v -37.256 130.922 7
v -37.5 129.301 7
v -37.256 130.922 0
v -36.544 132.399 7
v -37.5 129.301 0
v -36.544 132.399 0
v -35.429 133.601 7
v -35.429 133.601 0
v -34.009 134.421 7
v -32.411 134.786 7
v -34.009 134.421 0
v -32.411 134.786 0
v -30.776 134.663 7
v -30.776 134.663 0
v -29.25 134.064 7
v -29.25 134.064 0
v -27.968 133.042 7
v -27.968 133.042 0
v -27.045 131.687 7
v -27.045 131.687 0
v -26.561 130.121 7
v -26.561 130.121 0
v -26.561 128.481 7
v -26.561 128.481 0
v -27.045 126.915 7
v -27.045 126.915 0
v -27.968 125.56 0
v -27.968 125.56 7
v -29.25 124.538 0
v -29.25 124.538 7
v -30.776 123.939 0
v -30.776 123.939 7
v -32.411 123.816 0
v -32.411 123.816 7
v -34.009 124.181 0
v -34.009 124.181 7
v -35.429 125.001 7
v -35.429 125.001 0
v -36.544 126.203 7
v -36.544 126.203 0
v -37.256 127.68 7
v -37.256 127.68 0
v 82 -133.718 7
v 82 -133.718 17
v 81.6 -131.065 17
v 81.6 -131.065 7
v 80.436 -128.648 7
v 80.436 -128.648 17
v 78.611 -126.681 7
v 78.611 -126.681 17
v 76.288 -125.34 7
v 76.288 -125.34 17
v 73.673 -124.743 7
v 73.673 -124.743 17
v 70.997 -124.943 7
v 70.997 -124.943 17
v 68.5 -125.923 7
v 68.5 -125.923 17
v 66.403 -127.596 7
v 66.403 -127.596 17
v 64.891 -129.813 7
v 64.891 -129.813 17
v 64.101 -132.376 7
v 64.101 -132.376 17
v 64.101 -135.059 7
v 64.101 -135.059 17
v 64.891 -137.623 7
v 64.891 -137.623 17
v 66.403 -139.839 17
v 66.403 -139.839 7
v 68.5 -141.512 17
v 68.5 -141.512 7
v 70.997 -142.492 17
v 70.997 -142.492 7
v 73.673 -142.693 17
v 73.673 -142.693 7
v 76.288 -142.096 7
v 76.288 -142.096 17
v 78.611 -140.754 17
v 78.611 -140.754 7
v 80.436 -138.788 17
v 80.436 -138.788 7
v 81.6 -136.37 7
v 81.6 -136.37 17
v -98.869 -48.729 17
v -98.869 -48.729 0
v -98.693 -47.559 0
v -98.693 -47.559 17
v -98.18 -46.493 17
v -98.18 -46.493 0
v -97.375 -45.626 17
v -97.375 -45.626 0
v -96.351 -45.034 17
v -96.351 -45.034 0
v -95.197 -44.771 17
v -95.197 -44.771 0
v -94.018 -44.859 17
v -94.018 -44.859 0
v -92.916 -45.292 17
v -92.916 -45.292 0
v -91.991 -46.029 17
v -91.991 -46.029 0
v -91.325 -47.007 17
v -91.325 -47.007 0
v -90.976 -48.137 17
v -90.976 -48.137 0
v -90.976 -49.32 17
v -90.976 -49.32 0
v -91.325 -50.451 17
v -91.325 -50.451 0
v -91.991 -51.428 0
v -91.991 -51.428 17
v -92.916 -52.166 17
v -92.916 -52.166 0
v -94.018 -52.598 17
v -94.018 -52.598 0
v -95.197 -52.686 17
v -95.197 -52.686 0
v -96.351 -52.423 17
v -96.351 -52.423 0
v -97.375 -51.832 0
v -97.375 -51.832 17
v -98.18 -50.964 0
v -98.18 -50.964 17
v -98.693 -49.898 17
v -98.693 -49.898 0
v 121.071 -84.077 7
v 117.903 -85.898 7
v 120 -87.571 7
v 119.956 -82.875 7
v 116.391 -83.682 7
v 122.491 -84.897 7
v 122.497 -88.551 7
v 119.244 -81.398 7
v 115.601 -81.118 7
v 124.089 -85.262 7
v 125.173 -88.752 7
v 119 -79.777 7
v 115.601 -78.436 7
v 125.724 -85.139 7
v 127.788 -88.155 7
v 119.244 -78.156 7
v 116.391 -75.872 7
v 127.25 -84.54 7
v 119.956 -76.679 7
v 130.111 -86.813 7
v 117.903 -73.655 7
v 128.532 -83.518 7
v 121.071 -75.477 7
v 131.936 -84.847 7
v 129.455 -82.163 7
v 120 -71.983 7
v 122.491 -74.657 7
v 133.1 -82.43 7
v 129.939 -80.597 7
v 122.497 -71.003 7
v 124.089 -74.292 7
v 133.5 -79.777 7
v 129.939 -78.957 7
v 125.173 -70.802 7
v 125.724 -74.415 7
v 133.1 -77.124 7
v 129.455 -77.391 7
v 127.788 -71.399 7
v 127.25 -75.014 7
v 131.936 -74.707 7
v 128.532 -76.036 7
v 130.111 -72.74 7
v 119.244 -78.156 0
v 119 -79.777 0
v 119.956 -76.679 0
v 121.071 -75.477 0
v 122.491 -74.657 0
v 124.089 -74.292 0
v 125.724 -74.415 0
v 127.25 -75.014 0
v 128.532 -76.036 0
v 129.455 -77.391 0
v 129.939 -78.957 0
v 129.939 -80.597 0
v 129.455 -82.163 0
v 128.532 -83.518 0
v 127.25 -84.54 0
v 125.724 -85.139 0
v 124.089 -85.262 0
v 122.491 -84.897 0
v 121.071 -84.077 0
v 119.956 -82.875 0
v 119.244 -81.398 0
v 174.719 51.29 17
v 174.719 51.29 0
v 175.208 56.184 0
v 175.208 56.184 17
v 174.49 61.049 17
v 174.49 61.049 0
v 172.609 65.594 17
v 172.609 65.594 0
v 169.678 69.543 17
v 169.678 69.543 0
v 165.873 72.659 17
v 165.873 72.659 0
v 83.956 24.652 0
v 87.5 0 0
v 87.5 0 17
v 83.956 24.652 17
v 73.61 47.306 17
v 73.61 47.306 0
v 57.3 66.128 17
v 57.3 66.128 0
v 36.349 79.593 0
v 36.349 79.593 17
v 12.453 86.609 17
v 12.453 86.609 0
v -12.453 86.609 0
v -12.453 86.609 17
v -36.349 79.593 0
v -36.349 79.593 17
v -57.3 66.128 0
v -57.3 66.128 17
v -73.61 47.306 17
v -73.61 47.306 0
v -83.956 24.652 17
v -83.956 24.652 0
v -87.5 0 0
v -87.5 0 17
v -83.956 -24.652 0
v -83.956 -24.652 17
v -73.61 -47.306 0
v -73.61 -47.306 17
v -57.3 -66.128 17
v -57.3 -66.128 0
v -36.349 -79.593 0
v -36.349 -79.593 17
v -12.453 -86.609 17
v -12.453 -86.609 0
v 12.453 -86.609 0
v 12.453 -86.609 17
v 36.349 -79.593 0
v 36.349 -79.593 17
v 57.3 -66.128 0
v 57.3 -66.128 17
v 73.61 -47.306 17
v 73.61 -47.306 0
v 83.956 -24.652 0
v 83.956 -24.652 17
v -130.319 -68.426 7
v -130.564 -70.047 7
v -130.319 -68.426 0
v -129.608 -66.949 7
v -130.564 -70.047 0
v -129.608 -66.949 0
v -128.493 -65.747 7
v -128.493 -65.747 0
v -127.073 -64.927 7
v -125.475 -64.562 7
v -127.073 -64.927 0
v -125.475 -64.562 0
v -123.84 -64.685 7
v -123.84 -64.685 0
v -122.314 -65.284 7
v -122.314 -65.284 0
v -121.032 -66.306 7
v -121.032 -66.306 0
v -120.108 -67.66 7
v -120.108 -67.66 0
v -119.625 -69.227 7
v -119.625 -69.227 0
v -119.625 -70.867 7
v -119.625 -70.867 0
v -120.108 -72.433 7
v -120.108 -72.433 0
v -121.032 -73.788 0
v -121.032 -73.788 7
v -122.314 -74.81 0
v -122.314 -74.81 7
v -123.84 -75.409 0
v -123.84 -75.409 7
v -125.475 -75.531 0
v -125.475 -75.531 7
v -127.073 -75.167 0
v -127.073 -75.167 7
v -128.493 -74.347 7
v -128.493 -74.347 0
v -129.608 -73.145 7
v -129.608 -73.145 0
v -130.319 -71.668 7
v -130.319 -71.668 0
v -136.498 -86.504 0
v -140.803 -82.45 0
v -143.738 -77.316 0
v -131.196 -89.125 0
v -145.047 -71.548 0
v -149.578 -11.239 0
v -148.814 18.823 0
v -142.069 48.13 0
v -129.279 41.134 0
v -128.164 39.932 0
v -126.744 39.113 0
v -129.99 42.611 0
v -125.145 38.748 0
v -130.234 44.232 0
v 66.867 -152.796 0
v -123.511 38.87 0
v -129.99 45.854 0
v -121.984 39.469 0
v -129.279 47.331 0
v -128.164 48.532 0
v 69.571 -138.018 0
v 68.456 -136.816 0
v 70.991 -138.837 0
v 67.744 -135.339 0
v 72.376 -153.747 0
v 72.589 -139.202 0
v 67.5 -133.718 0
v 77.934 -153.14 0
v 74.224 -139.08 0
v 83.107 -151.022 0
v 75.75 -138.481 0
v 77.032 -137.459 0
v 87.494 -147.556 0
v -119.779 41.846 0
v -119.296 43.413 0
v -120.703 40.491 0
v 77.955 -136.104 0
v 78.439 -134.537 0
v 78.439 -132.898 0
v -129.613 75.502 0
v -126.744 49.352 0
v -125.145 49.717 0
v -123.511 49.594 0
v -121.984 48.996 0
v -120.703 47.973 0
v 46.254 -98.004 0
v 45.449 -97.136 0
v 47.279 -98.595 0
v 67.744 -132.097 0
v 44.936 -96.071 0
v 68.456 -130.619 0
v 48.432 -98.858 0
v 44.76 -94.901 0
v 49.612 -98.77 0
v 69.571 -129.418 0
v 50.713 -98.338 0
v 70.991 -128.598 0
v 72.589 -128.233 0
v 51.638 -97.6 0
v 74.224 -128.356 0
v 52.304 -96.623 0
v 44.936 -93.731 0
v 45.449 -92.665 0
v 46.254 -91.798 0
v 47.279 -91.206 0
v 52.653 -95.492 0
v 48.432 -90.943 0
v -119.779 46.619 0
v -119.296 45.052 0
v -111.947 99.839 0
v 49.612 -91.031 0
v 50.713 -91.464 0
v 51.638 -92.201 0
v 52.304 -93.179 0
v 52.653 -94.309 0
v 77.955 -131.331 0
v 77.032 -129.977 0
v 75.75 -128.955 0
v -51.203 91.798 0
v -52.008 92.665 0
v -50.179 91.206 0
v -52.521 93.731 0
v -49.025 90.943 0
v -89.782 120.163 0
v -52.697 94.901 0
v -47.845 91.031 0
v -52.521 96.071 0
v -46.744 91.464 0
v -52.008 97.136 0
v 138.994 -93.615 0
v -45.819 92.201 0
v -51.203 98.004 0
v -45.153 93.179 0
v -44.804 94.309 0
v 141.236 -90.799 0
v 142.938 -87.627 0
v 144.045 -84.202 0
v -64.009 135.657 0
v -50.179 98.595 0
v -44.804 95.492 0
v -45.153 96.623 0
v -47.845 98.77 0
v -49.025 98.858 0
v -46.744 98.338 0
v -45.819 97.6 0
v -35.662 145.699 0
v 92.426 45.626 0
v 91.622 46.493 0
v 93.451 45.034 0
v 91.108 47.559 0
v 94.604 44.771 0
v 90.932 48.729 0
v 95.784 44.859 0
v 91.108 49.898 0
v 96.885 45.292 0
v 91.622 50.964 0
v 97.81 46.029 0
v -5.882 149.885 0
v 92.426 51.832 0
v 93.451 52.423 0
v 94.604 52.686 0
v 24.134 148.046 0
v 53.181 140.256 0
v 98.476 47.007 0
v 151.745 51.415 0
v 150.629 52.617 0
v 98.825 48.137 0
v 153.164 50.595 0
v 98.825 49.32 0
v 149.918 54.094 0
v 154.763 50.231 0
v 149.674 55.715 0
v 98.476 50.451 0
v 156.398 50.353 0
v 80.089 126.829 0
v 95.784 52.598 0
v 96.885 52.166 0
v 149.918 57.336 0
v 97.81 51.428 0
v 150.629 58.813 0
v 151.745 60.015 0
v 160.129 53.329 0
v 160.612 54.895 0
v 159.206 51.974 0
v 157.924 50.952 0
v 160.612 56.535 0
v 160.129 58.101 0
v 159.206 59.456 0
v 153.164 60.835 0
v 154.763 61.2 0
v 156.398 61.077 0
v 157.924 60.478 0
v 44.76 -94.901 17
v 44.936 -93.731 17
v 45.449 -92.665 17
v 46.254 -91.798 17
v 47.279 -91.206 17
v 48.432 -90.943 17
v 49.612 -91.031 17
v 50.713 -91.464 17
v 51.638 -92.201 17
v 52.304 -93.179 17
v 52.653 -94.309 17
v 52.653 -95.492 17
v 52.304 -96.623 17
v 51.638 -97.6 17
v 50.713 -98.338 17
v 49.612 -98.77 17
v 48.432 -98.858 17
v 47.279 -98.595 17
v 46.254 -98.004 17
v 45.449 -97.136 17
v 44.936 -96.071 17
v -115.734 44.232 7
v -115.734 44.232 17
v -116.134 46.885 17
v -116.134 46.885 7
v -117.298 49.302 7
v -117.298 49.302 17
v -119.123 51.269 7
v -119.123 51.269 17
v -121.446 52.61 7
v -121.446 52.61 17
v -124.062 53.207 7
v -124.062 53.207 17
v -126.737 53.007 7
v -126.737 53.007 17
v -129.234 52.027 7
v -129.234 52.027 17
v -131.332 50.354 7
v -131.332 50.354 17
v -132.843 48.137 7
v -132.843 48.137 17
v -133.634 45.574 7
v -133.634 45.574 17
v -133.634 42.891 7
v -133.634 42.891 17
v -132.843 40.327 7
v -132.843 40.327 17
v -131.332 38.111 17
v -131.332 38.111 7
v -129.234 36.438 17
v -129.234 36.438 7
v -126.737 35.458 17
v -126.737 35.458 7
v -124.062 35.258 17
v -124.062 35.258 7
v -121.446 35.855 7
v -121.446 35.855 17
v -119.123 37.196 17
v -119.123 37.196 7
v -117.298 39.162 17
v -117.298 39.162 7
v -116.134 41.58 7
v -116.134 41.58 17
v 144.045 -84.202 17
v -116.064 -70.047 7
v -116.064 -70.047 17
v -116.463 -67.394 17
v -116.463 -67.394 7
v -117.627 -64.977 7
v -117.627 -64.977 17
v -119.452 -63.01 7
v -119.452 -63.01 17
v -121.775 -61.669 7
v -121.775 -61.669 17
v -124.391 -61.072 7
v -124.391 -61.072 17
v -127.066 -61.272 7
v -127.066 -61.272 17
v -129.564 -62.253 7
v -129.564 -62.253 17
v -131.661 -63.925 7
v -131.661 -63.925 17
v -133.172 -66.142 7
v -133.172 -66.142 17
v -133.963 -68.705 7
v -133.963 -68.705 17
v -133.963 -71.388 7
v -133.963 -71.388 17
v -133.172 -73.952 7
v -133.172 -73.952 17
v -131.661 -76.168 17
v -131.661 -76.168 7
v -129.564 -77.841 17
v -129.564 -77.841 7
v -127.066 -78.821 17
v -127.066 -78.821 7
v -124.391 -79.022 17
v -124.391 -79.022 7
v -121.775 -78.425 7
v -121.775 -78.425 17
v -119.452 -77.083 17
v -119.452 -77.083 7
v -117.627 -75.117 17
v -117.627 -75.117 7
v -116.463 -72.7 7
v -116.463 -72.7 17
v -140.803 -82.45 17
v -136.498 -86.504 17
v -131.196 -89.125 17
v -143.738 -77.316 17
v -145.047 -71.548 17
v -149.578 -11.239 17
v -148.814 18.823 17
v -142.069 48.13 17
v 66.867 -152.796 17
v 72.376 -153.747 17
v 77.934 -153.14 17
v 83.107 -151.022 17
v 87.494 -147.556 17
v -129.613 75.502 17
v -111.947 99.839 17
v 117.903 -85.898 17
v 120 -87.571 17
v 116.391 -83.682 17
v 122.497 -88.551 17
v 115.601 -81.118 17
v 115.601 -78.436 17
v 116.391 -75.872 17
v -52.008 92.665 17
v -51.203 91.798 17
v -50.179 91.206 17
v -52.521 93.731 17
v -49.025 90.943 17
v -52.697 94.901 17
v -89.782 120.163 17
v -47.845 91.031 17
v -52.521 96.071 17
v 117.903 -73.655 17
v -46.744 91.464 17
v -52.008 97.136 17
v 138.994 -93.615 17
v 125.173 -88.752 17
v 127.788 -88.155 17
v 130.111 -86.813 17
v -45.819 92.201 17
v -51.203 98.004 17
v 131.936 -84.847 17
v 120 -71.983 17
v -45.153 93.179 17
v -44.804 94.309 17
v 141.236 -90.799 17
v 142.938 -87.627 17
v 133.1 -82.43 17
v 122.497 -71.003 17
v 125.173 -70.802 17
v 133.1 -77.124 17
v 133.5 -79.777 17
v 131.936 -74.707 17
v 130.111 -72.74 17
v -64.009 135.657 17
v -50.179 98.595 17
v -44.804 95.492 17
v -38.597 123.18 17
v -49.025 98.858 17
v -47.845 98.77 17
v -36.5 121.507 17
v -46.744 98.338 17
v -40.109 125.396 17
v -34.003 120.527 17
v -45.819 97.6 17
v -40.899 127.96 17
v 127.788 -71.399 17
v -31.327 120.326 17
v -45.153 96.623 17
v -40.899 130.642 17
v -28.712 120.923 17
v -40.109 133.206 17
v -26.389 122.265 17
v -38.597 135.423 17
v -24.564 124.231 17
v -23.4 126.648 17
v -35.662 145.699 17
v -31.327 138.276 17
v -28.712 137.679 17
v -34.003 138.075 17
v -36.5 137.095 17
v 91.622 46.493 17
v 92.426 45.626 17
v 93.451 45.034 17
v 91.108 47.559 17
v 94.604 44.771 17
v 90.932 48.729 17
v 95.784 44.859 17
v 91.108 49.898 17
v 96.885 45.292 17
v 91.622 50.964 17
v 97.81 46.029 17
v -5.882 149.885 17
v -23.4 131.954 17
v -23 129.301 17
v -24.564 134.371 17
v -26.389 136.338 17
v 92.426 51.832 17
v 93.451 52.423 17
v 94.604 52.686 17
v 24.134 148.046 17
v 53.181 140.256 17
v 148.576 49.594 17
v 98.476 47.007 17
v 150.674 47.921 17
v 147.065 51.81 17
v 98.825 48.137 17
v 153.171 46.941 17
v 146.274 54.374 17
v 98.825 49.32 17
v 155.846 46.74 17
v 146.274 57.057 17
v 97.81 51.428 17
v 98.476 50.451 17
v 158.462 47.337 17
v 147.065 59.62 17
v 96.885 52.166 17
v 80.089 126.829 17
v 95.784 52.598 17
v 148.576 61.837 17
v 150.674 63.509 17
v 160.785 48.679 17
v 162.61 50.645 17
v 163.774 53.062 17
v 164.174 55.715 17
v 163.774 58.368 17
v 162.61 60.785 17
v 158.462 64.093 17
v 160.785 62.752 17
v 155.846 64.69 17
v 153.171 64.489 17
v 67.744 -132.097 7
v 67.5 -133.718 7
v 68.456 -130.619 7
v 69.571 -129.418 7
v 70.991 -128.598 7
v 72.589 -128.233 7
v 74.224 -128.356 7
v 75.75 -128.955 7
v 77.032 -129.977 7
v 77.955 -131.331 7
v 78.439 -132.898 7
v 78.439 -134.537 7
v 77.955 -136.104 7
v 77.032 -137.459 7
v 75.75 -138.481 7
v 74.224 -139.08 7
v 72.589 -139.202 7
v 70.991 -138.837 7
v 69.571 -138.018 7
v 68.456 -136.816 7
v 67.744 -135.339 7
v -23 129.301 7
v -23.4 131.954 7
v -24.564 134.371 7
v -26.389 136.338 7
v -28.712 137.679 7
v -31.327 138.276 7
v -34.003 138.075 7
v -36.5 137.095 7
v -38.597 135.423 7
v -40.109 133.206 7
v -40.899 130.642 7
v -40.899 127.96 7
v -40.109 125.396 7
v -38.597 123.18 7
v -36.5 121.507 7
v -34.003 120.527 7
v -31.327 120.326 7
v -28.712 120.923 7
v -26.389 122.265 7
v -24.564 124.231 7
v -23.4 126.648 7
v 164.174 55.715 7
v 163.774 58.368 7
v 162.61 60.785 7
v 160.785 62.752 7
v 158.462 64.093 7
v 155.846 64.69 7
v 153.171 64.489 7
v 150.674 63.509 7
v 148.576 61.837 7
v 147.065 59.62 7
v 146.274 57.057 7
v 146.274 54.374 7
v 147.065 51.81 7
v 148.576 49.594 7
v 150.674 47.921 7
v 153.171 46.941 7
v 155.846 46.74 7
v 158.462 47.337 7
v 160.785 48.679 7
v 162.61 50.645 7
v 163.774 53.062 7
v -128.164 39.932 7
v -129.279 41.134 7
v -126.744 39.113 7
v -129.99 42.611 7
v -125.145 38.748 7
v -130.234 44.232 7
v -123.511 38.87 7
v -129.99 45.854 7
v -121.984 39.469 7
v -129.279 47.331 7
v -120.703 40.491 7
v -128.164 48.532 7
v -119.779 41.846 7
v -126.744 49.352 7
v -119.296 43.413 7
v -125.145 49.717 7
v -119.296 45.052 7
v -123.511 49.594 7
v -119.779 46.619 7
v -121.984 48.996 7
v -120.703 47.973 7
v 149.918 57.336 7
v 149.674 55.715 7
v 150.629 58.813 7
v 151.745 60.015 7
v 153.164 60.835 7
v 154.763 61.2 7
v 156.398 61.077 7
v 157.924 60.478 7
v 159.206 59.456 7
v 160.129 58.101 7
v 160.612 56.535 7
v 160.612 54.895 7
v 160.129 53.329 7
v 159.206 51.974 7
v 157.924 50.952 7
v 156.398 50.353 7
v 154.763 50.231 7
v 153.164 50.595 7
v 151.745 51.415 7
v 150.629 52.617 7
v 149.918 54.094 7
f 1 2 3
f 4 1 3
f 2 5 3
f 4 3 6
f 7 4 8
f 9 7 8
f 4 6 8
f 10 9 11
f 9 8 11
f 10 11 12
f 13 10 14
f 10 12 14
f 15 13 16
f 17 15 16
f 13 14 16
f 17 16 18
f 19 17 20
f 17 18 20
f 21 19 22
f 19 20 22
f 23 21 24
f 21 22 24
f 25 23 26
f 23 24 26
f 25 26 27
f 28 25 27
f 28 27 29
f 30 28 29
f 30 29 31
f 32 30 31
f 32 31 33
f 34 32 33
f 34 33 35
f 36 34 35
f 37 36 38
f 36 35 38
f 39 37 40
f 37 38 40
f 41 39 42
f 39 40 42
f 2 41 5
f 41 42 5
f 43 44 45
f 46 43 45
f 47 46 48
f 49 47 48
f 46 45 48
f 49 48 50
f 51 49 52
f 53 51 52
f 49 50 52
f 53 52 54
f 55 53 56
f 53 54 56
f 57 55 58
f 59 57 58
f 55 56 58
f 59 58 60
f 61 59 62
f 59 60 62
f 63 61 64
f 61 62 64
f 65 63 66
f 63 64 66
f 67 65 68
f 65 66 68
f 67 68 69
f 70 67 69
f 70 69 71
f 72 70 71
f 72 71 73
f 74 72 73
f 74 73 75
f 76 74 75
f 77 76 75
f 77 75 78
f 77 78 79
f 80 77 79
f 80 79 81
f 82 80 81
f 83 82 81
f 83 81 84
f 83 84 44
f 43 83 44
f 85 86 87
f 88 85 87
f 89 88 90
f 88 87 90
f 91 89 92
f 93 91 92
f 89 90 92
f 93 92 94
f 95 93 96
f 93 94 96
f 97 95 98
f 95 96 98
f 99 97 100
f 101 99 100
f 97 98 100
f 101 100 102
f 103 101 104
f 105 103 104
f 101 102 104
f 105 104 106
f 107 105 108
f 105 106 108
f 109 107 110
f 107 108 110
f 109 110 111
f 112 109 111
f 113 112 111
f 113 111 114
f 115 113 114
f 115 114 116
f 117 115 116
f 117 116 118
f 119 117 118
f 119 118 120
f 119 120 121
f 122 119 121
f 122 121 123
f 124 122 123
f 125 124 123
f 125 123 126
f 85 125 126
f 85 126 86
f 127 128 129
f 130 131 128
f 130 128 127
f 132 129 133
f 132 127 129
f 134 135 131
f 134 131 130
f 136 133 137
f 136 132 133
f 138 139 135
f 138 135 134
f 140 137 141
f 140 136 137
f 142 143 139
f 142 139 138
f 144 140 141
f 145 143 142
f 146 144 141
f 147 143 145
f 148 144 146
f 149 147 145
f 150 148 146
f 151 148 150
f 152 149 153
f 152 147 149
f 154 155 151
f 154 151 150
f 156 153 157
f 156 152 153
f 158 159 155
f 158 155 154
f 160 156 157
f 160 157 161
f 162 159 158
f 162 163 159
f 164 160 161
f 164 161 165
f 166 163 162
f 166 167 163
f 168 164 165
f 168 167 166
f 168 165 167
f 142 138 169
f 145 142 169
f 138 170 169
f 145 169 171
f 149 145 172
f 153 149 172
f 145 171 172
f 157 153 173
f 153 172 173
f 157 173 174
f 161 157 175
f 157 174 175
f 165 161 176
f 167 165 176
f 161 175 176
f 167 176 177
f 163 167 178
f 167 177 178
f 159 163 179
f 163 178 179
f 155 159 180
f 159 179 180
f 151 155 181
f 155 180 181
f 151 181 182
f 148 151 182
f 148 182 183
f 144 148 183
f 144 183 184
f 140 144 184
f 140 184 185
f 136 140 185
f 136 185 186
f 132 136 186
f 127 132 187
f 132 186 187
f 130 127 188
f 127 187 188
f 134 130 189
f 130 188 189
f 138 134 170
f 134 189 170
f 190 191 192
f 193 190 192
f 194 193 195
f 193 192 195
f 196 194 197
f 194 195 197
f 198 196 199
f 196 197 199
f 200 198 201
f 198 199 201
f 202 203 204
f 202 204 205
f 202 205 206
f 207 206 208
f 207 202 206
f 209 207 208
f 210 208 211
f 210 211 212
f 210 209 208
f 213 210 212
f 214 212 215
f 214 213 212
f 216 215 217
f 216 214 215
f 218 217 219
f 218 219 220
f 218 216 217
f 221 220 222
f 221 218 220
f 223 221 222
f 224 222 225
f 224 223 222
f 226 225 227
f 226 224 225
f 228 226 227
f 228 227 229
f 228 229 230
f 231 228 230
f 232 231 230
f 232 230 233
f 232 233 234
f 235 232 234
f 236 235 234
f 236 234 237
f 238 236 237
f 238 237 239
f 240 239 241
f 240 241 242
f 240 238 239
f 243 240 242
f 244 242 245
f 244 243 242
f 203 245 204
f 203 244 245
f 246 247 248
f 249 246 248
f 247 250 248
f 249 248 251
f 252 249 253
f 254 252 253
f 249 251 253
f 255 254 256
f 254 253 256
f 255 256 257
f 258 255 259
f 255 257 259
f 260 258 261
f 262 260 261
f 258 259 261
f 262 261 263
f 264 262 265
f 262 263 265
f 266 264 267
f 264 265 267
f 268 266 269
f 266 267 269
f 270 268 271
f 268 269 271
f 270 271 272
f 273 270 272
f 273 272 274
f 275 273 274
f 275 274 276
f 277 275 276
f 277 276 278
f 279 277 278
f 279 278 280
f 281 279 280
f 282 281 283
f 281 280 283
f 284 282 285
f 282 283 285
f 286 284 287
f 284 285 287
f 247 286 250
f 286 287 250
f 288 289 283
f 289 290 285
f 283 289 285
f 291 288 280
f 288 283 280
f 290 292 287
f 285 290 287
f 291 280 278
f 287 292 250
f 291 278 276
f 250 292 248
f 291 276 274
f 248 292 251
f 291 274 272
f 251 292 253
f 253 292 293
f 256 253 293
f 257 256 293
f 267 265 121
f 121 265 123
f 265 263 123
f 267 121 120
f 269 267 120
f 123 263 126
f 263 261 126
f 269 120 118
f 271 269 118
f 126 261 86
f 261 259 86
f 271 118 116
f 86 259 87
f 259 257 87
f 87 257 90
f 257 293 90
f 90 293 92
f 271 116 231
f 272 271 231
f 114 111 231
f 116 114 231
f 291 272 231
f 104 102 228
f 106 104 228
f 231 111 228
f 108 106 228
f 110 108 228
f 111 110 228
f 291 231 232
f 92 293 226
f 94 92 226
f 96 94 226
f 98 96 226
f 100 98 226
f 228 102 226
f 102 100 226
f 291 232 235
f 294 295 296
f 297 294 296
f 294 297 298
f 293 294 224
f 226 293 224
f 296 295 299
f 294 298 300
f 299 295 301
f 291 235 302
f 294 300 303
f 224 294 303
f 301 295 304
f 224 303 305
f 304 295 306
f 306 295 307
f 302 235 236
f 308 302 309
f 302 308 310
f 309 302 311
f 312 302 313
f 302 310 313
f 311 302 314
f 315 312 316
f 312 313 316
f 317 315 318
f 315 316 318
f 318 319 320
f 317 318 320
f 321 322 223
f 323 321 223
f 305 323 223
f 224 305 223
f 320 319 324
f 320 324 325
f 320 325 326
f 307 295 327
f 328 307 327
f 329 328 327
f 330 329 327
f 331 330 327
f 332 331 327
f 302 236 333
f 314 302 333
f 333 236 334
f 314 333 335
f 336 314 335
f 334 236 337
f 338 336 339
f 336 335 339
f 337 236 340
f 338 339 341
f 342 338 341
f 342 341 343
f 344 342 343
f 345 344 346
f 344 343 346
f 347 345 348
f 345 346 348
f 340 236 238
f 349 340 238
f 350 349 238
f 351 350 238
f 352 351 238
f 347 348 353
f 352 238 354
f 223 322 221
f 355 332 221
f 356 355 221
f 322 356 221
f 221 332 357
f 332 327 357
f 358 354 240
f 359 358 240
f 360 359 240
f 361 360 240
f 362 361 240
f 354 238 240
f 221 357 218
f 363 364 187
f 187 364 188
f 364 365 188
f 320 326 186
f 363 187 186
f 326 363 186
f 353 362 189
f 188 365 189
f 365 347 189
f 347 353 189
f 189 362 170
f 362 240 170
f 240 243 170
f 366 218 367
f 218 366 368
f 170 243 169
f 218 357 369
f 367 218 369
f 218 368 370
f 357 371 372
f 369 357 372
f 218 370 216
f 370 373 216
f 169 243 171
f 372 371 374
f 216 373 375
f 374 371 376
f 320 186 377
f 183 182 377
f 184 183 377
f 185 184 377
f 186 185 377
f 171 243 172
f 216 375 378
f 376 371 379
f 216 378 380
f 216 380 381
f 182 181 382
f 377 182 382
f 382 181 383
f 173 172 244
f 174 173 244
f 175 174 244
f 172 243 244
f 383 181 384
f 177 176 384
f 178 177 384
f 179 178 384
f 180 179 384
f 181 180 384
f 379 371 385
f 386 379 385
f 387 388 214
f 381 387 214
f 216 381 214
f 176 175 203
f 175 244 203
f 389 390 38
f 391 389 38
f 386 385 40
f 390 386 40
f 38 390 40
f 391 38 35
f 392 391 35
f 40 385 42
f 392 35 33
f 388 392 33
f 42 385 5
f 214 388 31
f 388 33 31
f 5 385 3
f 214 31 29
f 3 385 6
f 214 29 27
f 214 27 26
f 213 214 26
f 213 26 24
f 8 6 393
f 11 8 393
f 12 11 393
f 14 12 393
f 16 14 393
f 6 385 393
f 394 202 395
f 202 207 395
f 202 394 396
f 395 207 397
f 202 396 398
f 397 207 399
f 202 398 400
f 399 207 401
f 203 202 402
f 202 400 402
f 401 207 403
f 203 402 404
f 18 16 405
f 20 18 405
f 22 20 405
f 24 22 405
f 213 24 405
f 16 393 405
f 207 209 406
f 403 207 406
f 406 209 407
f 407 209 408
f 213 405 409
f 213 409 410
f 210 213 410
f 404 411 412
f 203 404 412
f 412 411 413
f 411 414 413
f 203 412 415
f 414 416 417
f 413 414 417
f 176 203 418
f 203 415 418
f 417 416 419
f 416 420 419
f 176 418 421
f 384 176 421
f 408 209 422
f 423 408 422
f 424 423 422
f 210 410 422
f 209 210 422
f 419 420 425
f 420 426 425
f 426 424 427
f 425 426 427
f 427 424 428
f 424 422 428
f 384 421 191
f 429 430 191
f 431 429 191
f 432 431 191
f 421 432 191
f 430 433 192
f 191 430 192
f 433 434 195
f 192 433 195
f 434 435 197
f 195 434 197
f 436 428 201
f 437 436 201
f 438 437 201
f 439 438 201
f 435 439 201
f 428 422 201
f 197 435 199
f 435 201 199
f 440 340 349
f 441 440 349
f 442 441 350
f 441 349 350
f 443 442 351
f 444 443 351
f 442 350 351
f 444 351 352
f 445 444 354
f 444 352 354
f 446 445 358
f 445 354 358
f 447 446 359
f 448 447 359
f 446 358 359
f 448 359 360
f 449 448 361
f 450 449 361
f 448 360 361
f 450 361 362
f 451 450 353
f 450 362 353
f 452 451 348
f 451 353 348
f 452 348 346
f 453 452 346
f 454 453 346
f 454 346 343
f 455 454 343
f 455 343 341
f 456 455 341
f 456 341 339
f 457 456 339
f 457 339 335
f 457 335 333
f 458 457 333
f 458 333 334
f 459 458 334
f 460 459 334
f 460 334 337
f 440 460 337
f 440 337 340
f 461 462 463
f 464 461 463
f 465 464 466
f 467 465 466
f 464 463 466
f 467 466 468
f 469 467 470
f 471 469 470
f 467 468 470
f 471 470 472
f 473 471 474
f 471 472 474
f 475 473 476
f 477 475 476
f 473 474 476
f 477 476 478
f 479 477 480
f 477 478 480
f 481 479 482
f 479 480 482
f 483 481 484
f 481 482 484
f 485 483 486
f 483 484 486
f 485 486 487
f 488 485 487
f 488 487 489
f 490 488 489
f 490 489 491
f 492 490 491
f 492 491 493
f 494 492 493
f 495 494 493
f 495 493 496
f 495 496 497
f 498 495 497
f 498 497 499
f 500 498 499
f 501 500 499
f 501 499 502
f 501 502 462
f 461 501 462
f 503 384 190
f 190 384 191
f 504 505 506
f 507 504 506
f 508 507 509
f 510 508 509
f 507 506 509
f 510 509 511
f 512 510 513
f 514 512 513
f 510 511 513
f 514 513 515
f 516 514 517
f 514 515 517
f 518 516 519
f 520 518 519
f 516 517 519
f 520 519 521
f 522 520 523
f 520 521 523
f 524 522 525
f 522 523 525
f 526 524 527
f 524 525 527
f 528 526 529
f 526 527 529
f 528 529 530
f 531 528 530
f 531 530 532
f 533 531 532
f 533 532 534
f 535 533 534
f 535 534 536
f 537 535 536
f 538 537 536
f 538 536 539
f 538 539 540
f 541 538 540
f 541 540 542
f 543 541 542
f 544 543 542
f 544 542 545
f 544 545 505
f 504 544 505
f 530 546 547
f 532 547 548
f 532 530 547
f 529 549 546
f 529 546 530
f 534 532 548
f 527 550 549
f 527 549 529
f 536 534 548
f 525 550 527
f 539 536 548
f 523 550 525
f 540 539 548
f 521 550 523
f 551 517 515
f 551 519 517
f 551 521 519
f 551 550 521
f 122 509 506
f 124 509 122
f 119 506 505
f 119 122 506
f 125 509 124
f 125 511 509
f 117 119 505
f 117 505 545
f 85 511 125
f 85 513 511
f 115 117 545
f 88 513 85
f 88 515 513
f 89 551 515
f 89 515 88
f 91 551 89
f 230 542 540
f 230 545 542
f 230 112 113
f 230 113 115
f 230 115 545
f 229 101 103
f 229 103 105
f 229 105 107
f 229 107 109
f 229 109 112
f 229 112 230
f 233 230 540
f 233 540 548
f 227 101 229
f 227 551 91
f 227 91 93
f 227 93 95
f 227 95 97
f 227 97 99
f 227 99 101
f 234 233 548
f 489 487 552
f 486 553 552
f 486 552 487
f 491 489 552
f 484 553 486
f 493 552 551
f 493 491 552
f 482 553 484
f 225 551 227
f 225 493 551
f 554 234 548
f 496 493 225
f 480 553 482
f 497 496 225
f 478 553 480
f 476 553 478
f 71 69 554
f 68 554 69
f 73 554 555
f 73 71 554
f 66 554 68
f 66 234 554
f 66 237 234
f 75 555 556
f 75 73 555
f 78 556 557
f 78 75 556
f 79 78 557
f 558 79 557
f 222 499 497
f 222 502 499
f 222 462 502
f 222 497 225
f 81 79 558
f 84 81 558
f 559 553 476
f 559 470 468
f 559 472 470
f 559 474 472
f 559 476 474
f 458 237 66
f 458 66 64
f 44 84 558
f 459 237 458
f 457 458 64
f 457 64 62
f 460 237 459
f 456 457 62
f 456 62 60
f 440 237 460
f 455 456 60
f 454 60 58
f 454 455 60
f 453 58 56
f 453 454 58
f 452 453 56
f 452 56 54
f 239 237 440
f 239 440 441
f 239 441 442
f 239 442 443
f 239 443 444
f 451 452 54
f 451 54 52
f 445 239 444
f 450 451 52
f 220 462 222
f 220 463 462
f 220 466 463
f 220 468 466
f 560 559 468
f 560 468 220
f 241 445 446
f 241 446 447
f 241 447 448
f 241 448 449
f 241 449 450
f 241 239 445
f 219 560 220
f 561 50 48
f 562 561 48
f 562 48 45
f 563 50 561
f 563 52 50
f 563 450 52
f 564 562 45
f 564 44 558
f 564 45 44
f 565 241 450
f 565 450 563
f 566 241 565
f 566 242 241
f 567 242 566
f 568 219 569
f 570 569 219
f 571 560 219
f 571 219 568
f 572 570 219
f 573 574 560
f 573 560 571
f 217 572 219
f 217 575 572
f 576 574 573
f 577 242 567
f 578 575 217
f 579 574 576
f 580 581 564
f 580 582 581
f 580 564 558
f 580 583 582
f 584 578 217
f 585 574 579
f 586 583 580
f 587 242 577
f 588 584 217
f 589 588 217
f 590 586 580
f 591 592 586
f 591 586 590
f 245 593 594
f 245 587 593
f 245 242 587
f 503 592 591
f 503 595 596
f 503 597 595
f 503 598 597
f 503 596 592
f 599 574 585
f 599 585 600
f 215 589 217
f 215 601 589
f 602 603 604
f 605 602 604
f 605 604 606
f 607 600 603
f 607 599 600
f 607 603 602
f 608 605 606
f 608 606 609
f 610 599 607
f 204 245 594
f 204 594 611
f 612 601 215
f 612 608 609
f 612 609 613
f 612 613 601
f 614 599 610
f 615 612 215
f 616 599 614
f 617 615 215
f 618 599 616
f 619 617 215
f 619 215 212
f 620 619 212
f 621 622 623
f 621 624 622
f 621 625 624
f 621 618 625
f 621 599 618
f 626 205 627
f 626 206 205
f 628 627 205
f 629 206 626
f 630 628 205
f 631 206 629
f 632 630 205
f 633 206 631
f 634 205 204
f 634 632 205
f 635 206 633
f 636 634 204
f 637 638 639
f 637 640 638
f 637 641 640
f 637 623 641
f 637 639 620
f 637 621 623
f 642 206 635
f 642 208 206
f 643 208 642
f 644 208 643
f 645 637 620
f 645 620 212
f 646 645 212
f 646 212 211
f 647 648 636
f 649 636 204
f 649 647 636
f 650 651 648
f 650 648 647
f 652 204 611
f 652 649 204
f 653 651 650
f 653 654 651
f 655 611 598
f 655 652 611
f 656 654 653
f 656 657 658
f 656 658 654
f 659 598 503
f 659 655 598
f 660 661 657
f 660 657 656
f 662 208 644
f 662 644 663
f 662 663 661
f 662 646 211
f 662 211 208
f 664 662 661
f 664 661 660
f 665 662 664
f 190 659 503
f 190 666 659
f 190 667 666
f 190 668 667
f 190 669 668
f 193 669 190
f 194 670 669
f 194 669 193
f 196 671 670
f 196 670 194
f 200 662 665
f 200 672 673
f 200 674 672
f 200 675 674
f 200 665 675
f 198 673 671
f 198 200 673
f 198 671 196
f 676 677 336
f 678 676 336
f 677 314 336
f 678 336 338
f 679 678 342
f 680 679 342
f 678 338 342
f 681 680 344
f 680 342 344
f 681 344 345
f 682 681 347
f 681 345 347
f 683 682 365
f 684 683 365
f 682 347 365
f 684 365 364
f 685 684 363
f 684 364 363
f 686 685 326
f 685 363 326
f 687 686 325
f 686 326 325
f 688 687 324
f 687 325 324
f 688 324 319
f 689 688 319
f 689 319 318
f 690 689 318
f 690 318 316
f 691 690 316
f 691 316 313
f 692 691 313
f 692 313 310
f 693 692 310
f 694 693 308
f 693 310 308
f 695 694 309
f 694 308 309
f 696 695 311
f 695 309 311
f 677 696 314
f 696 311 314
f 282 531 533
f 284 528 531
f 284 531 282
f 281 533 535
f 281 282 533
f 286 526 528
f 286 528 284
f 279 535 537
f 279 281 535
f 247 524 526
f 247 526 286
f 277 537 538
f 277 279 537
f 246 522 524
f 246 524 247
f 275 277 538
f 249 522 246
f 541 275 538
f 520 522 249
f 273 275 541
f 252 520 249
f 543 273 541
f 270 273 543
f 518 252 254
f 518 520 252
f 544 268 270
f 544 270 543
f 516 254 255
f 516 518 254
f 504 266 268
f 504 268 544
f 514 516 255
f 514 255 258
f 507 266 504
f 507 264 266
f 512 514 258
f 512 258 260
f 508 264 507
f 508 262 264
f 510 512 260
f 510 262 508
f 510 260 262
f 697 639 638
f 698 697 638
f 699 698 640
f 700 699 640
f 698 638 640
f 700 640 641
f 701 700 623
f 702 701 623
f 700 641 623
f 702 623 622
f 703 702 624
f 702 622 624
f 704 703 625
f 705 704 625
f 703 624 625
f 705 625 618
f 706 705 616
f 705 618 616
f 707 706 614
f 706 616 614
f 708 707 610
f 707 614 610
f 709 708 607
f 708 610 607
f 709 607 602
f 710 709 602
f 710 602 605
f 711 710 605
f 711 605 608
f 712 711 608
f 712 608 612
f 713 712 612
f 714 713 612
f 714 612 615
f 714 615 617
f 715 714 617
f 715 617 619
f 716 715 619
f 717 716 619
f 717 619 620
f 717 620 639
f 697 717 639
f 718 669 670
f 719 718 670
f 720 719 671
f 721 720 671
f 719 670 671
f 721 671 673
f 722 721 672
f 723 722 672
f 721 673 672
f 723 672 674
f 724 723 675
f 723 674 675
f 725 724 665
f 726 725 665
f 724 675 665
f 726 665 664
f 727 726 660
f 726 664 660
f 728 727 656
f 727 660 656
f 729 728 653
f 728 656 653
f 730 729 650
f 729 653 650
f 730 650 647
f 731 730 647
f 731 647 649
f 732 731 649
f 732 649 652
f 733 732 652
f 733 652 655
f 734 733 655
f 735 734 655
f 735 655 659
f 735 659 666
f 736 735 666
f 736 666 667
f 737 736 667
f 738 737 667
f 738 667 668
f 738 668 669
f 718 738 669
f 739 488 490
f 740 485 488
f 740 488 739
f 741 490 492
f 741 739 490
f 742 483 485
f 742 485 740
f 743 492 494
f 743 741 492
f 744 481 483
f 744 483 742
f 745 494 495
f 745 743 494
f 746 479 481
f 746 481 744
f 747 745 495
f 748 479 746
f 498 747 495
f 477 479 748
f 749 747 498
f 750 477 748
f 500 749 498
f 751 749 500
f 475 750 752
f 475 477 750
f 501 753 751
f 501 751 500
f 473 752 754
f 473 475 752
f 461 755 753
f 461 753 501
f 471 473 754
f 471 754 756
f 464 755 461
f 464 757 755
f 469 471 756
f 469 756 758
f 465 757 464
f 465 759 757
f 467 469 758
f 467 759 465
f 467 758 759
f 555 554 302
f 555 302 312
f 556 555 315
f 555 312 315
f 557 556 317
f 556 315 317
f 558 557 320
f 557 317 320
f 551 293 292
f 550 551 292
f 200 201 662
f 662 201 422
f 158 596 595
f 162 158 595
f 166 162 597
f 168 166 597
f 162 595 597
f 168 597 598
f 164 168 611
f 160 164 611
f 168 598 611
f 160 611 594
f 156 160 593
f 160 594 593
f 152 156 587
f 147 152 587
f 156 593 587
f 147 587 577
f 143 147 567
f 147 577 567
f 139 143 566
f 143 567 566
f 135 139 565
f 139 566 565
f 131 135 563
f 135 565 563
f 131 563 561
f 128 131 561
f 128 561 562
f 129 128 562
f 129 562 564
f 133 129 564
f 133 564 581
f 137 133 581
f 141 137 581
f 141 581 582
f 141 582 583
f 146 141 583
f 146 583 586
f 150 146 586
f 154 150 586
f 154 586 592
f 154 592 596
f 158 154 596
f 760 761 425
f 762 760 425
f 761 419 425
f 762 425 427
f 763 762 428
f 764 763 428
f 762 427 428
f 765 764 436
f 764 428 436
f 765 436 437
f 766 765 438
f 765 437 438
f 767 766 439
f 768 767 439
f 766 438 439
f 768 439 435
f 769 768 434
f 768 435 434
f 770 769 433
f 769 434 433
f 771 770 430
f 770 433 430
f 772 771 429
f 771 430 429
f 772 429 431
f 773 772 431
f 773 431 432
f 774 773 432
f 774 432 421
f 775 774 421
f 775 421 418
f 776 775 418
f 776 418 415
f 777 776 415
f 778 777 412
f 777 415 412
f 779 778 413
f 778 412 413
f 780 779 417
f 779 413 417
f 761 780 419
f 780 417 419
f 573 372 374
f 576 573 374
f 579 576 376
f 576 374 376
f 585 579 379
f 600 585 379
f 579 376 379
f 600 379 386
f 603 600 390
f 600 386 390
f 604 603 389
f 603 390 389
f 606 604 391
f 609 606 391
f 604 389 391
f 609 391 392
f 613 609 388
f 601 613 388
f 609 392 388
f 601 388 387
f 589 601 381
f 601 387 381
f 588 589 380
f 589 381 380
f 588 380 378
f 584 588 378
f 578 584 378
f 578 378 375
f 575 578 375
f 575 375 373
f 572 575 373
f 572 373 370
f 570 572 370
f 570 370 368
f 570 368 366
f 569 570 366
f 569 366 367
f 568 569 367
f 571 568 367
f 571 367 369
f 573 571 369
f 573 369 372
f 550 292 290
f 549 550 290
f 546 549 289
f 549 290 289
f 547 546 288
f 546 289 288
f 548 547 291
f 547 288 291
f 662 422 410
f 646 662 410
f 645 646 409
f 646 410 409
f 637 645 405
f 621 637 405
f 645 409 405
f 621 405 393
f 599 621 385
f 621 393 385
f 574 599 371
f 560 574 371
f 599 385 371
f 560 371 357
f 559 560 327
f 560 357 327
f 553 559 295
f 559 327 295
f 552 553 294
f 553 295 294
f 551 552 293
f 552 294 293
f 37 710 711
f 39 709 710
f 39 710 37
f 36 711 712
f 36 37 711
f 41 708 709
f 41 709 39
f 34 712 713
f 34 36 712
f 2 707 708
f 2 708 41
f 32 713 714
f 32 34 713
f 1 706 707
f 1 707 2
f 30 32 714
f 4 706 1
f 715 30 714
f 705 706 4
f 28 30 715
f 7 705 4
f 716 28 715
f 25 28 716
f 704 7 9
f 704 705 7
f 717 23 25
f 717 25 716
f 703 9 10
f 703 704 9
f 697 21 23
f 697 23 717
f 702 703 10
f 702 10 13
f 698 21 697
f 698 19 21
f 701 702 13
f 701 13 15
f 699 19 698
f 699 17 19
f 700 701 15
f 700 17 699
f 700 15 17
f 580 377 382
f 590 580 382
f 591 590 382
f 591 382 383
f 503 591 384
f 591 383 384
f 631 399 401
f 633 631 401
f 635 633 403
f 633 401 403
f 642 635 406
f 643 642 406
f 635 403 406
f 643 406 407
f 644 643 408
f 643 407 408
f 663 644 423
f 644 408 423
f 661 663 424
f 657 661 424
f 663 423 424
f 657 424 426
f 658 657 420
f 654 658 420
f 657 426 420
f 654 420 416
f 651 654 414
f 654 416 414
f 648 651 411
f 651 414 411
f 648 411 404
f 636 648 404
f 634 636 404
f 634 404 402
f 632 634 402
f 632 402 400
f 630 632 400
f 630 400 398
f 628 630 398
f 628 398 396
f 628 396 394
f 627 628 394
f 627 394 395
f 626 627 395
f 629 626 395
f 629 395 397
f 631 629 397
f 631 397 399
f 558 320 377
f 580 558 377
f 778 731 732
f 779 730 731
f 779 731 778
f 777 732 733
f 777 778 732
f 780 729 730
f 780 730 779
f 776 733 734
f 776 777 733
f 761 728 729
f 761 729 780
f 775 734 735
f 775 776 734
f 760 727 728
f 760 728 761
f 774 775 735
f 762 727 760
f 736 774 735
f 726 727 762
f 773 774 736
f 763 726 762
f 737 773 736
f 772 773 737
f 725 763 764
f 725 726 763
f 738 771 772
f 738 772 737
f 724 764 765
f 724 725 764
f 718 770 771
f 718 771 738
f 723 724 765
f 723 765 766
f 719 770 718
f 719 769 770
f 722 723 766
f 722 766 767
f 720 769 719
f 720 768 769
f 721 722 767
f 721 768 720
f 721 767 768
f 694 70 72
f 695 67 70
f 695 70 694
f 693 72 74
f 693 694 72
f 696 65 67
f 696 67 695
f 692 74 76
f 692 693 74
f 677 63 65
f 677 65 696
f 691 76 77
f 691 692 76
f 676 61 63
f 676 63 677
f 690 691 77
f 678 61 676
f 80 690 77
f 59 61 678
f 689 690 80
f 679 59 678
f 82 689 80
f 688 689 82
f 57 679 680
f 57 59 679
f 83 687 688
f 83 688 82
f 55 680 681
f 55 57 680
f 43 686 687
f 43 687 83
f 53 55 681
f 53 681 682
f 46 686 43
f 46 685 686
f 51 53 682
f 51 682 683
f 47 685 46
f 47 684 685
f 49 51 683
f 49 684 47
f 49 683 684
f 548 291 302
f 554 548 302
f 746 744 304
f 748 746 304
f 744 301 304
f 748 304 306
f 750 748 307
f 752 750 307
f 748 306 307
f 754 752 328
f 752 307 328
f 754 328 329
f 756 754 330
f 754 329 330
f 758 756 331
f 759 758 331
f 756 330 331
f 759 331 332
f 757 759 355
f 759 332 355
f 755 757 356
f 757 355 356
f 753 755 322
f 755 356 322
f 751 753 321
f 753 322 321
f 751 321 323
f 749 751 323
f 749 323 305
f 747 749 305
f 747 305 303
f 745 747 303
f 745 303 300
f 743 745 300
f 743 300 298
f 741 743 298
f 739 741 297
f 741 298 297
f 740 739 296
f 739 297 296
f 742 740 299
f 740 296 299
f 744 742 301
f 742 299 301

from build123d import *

# Parameters (mm, degrees)
SKETCH1_R                       = 4
SKETCH1_R_2                     = 87.5
BOSS_EXTRUDE1_DEPTH             = 17
CBORE_FOR_M10_SHCS1_D           = 11
CBORE_FOR_M10_SHCS1_CBORE_D     = 18
CBORE_FOR_M10_SHCS1_CBORE_DEPTH = 10
F_3_8_16_TAPPED_HOLE3_D         = 7.9375


with BuildPart() as part:
    # Sketch1 → Boss-Extrude1 (new body)
    with BuildSketch(Plane.XY):
        with BuildLine():
            Line((-131.19643785, -89.124723518), (66.8670709, -152.795612062))
            ThreePointArc((66.8670709, -152.795612062), (77.933659306, -153.140329428), (87.494178001, -147.556003928))
            Line((87.494178001, -147.556003928), (138.994178001, -93.615245818))
            ThreePointArc((138.994178001, -93.615245818), (142.158380517, -89.25120713), (144.044882633, -84.201640712))
            Line((144.044882633, -84.201640712), (174.718661169, 51.290400995))
            ThreePointArc((174.718661169, 51.290400995), (173.689671163, 63.379486111), (165.873431227, 72.659097776))
            Line((165.873431227, 72.659097776), (80.089309433, 126.829422905))
            ThreePointArc((80.089309433, 126.829422905), (-77.284768492, 128.557631275), (-149.578321741, -11.239469072))
            Line((-149.578321741, -11.239469072), (-145.046651368, -71.548336401))
            ThreePointArc((-145.046651368, -71.548336401), (-140.803414929, -82.449846894), (-131.19643785, -89.124723518))
        make_face()
        with Locations((-125.063508749, -70.046782494)):
            Circle(SKETCH1_R, mode=Mode.SUBTRACT)
        with Locations((73.000000001, -133.717671038)):
            Circle(SKETCH1_R, mode=Mode.SUBTRACT)
        with Locations((124.500000001, -79.776912929)):
            Circle(SKETCH1_R, mode=Mode.SUBTRACT)
        with Locations((155.173778537, 55.715128778)):
            Circle(SKETCH1_R, mode=Mode.SUBTRACT)
        with Locations((-32, 129.301071167)):
            Circle(SKETCH1_R, mode=Mode.SUBTRACT)
        Circle(SKETCH1_R_2, mode=Mode.SUBTRACT)
        with Locations((-124.734461308, 44.232368469)):
            Circle(SKETCH1_R, mode=Mode.SUBTRACT)
    extrude(amount=BOSS_EXTRUDE1_DEPTH)

    # CBORE for M10 SHCS1 (through all)
    with Locations(Plane(origin=(-124.734461308, 44.232368469, 17), x_dir=(1, 0, 0), z_dir=(0, 0, 1))):
        with Locations((0, 0), (92.734461308, 85.068702698), (279.908239845, 11.482760309), (249.234461309, -124.009281398), (197.734461309, -177.950039507), (-0.329047441, -114.279150963)):
            CounterBoreHole(CBORE_FOR_M10_SHCS1_D / 2, CBORE_FOR_M10_SHCS1_CBORE_D / 2, CBORE_FOR_M10_SHCS1_CBORE_DEPTH)

    # 3/8-16 Tapped Hole3 (through all)
    with Locations(Plane(origin=(-48.728615608, 94.900708221, 17), x_dir=(1, 0, 0), z_dir=(0, 0, 1))):
        with Locations((0, 0), (143.629323829, -46.172092613), (97.457231216, -189.801416442), (-46.172092613, -143.629323829)):
            Hole(F_3_8_16_TAPPED_HOLE3_D / 2)


solid = part.part
